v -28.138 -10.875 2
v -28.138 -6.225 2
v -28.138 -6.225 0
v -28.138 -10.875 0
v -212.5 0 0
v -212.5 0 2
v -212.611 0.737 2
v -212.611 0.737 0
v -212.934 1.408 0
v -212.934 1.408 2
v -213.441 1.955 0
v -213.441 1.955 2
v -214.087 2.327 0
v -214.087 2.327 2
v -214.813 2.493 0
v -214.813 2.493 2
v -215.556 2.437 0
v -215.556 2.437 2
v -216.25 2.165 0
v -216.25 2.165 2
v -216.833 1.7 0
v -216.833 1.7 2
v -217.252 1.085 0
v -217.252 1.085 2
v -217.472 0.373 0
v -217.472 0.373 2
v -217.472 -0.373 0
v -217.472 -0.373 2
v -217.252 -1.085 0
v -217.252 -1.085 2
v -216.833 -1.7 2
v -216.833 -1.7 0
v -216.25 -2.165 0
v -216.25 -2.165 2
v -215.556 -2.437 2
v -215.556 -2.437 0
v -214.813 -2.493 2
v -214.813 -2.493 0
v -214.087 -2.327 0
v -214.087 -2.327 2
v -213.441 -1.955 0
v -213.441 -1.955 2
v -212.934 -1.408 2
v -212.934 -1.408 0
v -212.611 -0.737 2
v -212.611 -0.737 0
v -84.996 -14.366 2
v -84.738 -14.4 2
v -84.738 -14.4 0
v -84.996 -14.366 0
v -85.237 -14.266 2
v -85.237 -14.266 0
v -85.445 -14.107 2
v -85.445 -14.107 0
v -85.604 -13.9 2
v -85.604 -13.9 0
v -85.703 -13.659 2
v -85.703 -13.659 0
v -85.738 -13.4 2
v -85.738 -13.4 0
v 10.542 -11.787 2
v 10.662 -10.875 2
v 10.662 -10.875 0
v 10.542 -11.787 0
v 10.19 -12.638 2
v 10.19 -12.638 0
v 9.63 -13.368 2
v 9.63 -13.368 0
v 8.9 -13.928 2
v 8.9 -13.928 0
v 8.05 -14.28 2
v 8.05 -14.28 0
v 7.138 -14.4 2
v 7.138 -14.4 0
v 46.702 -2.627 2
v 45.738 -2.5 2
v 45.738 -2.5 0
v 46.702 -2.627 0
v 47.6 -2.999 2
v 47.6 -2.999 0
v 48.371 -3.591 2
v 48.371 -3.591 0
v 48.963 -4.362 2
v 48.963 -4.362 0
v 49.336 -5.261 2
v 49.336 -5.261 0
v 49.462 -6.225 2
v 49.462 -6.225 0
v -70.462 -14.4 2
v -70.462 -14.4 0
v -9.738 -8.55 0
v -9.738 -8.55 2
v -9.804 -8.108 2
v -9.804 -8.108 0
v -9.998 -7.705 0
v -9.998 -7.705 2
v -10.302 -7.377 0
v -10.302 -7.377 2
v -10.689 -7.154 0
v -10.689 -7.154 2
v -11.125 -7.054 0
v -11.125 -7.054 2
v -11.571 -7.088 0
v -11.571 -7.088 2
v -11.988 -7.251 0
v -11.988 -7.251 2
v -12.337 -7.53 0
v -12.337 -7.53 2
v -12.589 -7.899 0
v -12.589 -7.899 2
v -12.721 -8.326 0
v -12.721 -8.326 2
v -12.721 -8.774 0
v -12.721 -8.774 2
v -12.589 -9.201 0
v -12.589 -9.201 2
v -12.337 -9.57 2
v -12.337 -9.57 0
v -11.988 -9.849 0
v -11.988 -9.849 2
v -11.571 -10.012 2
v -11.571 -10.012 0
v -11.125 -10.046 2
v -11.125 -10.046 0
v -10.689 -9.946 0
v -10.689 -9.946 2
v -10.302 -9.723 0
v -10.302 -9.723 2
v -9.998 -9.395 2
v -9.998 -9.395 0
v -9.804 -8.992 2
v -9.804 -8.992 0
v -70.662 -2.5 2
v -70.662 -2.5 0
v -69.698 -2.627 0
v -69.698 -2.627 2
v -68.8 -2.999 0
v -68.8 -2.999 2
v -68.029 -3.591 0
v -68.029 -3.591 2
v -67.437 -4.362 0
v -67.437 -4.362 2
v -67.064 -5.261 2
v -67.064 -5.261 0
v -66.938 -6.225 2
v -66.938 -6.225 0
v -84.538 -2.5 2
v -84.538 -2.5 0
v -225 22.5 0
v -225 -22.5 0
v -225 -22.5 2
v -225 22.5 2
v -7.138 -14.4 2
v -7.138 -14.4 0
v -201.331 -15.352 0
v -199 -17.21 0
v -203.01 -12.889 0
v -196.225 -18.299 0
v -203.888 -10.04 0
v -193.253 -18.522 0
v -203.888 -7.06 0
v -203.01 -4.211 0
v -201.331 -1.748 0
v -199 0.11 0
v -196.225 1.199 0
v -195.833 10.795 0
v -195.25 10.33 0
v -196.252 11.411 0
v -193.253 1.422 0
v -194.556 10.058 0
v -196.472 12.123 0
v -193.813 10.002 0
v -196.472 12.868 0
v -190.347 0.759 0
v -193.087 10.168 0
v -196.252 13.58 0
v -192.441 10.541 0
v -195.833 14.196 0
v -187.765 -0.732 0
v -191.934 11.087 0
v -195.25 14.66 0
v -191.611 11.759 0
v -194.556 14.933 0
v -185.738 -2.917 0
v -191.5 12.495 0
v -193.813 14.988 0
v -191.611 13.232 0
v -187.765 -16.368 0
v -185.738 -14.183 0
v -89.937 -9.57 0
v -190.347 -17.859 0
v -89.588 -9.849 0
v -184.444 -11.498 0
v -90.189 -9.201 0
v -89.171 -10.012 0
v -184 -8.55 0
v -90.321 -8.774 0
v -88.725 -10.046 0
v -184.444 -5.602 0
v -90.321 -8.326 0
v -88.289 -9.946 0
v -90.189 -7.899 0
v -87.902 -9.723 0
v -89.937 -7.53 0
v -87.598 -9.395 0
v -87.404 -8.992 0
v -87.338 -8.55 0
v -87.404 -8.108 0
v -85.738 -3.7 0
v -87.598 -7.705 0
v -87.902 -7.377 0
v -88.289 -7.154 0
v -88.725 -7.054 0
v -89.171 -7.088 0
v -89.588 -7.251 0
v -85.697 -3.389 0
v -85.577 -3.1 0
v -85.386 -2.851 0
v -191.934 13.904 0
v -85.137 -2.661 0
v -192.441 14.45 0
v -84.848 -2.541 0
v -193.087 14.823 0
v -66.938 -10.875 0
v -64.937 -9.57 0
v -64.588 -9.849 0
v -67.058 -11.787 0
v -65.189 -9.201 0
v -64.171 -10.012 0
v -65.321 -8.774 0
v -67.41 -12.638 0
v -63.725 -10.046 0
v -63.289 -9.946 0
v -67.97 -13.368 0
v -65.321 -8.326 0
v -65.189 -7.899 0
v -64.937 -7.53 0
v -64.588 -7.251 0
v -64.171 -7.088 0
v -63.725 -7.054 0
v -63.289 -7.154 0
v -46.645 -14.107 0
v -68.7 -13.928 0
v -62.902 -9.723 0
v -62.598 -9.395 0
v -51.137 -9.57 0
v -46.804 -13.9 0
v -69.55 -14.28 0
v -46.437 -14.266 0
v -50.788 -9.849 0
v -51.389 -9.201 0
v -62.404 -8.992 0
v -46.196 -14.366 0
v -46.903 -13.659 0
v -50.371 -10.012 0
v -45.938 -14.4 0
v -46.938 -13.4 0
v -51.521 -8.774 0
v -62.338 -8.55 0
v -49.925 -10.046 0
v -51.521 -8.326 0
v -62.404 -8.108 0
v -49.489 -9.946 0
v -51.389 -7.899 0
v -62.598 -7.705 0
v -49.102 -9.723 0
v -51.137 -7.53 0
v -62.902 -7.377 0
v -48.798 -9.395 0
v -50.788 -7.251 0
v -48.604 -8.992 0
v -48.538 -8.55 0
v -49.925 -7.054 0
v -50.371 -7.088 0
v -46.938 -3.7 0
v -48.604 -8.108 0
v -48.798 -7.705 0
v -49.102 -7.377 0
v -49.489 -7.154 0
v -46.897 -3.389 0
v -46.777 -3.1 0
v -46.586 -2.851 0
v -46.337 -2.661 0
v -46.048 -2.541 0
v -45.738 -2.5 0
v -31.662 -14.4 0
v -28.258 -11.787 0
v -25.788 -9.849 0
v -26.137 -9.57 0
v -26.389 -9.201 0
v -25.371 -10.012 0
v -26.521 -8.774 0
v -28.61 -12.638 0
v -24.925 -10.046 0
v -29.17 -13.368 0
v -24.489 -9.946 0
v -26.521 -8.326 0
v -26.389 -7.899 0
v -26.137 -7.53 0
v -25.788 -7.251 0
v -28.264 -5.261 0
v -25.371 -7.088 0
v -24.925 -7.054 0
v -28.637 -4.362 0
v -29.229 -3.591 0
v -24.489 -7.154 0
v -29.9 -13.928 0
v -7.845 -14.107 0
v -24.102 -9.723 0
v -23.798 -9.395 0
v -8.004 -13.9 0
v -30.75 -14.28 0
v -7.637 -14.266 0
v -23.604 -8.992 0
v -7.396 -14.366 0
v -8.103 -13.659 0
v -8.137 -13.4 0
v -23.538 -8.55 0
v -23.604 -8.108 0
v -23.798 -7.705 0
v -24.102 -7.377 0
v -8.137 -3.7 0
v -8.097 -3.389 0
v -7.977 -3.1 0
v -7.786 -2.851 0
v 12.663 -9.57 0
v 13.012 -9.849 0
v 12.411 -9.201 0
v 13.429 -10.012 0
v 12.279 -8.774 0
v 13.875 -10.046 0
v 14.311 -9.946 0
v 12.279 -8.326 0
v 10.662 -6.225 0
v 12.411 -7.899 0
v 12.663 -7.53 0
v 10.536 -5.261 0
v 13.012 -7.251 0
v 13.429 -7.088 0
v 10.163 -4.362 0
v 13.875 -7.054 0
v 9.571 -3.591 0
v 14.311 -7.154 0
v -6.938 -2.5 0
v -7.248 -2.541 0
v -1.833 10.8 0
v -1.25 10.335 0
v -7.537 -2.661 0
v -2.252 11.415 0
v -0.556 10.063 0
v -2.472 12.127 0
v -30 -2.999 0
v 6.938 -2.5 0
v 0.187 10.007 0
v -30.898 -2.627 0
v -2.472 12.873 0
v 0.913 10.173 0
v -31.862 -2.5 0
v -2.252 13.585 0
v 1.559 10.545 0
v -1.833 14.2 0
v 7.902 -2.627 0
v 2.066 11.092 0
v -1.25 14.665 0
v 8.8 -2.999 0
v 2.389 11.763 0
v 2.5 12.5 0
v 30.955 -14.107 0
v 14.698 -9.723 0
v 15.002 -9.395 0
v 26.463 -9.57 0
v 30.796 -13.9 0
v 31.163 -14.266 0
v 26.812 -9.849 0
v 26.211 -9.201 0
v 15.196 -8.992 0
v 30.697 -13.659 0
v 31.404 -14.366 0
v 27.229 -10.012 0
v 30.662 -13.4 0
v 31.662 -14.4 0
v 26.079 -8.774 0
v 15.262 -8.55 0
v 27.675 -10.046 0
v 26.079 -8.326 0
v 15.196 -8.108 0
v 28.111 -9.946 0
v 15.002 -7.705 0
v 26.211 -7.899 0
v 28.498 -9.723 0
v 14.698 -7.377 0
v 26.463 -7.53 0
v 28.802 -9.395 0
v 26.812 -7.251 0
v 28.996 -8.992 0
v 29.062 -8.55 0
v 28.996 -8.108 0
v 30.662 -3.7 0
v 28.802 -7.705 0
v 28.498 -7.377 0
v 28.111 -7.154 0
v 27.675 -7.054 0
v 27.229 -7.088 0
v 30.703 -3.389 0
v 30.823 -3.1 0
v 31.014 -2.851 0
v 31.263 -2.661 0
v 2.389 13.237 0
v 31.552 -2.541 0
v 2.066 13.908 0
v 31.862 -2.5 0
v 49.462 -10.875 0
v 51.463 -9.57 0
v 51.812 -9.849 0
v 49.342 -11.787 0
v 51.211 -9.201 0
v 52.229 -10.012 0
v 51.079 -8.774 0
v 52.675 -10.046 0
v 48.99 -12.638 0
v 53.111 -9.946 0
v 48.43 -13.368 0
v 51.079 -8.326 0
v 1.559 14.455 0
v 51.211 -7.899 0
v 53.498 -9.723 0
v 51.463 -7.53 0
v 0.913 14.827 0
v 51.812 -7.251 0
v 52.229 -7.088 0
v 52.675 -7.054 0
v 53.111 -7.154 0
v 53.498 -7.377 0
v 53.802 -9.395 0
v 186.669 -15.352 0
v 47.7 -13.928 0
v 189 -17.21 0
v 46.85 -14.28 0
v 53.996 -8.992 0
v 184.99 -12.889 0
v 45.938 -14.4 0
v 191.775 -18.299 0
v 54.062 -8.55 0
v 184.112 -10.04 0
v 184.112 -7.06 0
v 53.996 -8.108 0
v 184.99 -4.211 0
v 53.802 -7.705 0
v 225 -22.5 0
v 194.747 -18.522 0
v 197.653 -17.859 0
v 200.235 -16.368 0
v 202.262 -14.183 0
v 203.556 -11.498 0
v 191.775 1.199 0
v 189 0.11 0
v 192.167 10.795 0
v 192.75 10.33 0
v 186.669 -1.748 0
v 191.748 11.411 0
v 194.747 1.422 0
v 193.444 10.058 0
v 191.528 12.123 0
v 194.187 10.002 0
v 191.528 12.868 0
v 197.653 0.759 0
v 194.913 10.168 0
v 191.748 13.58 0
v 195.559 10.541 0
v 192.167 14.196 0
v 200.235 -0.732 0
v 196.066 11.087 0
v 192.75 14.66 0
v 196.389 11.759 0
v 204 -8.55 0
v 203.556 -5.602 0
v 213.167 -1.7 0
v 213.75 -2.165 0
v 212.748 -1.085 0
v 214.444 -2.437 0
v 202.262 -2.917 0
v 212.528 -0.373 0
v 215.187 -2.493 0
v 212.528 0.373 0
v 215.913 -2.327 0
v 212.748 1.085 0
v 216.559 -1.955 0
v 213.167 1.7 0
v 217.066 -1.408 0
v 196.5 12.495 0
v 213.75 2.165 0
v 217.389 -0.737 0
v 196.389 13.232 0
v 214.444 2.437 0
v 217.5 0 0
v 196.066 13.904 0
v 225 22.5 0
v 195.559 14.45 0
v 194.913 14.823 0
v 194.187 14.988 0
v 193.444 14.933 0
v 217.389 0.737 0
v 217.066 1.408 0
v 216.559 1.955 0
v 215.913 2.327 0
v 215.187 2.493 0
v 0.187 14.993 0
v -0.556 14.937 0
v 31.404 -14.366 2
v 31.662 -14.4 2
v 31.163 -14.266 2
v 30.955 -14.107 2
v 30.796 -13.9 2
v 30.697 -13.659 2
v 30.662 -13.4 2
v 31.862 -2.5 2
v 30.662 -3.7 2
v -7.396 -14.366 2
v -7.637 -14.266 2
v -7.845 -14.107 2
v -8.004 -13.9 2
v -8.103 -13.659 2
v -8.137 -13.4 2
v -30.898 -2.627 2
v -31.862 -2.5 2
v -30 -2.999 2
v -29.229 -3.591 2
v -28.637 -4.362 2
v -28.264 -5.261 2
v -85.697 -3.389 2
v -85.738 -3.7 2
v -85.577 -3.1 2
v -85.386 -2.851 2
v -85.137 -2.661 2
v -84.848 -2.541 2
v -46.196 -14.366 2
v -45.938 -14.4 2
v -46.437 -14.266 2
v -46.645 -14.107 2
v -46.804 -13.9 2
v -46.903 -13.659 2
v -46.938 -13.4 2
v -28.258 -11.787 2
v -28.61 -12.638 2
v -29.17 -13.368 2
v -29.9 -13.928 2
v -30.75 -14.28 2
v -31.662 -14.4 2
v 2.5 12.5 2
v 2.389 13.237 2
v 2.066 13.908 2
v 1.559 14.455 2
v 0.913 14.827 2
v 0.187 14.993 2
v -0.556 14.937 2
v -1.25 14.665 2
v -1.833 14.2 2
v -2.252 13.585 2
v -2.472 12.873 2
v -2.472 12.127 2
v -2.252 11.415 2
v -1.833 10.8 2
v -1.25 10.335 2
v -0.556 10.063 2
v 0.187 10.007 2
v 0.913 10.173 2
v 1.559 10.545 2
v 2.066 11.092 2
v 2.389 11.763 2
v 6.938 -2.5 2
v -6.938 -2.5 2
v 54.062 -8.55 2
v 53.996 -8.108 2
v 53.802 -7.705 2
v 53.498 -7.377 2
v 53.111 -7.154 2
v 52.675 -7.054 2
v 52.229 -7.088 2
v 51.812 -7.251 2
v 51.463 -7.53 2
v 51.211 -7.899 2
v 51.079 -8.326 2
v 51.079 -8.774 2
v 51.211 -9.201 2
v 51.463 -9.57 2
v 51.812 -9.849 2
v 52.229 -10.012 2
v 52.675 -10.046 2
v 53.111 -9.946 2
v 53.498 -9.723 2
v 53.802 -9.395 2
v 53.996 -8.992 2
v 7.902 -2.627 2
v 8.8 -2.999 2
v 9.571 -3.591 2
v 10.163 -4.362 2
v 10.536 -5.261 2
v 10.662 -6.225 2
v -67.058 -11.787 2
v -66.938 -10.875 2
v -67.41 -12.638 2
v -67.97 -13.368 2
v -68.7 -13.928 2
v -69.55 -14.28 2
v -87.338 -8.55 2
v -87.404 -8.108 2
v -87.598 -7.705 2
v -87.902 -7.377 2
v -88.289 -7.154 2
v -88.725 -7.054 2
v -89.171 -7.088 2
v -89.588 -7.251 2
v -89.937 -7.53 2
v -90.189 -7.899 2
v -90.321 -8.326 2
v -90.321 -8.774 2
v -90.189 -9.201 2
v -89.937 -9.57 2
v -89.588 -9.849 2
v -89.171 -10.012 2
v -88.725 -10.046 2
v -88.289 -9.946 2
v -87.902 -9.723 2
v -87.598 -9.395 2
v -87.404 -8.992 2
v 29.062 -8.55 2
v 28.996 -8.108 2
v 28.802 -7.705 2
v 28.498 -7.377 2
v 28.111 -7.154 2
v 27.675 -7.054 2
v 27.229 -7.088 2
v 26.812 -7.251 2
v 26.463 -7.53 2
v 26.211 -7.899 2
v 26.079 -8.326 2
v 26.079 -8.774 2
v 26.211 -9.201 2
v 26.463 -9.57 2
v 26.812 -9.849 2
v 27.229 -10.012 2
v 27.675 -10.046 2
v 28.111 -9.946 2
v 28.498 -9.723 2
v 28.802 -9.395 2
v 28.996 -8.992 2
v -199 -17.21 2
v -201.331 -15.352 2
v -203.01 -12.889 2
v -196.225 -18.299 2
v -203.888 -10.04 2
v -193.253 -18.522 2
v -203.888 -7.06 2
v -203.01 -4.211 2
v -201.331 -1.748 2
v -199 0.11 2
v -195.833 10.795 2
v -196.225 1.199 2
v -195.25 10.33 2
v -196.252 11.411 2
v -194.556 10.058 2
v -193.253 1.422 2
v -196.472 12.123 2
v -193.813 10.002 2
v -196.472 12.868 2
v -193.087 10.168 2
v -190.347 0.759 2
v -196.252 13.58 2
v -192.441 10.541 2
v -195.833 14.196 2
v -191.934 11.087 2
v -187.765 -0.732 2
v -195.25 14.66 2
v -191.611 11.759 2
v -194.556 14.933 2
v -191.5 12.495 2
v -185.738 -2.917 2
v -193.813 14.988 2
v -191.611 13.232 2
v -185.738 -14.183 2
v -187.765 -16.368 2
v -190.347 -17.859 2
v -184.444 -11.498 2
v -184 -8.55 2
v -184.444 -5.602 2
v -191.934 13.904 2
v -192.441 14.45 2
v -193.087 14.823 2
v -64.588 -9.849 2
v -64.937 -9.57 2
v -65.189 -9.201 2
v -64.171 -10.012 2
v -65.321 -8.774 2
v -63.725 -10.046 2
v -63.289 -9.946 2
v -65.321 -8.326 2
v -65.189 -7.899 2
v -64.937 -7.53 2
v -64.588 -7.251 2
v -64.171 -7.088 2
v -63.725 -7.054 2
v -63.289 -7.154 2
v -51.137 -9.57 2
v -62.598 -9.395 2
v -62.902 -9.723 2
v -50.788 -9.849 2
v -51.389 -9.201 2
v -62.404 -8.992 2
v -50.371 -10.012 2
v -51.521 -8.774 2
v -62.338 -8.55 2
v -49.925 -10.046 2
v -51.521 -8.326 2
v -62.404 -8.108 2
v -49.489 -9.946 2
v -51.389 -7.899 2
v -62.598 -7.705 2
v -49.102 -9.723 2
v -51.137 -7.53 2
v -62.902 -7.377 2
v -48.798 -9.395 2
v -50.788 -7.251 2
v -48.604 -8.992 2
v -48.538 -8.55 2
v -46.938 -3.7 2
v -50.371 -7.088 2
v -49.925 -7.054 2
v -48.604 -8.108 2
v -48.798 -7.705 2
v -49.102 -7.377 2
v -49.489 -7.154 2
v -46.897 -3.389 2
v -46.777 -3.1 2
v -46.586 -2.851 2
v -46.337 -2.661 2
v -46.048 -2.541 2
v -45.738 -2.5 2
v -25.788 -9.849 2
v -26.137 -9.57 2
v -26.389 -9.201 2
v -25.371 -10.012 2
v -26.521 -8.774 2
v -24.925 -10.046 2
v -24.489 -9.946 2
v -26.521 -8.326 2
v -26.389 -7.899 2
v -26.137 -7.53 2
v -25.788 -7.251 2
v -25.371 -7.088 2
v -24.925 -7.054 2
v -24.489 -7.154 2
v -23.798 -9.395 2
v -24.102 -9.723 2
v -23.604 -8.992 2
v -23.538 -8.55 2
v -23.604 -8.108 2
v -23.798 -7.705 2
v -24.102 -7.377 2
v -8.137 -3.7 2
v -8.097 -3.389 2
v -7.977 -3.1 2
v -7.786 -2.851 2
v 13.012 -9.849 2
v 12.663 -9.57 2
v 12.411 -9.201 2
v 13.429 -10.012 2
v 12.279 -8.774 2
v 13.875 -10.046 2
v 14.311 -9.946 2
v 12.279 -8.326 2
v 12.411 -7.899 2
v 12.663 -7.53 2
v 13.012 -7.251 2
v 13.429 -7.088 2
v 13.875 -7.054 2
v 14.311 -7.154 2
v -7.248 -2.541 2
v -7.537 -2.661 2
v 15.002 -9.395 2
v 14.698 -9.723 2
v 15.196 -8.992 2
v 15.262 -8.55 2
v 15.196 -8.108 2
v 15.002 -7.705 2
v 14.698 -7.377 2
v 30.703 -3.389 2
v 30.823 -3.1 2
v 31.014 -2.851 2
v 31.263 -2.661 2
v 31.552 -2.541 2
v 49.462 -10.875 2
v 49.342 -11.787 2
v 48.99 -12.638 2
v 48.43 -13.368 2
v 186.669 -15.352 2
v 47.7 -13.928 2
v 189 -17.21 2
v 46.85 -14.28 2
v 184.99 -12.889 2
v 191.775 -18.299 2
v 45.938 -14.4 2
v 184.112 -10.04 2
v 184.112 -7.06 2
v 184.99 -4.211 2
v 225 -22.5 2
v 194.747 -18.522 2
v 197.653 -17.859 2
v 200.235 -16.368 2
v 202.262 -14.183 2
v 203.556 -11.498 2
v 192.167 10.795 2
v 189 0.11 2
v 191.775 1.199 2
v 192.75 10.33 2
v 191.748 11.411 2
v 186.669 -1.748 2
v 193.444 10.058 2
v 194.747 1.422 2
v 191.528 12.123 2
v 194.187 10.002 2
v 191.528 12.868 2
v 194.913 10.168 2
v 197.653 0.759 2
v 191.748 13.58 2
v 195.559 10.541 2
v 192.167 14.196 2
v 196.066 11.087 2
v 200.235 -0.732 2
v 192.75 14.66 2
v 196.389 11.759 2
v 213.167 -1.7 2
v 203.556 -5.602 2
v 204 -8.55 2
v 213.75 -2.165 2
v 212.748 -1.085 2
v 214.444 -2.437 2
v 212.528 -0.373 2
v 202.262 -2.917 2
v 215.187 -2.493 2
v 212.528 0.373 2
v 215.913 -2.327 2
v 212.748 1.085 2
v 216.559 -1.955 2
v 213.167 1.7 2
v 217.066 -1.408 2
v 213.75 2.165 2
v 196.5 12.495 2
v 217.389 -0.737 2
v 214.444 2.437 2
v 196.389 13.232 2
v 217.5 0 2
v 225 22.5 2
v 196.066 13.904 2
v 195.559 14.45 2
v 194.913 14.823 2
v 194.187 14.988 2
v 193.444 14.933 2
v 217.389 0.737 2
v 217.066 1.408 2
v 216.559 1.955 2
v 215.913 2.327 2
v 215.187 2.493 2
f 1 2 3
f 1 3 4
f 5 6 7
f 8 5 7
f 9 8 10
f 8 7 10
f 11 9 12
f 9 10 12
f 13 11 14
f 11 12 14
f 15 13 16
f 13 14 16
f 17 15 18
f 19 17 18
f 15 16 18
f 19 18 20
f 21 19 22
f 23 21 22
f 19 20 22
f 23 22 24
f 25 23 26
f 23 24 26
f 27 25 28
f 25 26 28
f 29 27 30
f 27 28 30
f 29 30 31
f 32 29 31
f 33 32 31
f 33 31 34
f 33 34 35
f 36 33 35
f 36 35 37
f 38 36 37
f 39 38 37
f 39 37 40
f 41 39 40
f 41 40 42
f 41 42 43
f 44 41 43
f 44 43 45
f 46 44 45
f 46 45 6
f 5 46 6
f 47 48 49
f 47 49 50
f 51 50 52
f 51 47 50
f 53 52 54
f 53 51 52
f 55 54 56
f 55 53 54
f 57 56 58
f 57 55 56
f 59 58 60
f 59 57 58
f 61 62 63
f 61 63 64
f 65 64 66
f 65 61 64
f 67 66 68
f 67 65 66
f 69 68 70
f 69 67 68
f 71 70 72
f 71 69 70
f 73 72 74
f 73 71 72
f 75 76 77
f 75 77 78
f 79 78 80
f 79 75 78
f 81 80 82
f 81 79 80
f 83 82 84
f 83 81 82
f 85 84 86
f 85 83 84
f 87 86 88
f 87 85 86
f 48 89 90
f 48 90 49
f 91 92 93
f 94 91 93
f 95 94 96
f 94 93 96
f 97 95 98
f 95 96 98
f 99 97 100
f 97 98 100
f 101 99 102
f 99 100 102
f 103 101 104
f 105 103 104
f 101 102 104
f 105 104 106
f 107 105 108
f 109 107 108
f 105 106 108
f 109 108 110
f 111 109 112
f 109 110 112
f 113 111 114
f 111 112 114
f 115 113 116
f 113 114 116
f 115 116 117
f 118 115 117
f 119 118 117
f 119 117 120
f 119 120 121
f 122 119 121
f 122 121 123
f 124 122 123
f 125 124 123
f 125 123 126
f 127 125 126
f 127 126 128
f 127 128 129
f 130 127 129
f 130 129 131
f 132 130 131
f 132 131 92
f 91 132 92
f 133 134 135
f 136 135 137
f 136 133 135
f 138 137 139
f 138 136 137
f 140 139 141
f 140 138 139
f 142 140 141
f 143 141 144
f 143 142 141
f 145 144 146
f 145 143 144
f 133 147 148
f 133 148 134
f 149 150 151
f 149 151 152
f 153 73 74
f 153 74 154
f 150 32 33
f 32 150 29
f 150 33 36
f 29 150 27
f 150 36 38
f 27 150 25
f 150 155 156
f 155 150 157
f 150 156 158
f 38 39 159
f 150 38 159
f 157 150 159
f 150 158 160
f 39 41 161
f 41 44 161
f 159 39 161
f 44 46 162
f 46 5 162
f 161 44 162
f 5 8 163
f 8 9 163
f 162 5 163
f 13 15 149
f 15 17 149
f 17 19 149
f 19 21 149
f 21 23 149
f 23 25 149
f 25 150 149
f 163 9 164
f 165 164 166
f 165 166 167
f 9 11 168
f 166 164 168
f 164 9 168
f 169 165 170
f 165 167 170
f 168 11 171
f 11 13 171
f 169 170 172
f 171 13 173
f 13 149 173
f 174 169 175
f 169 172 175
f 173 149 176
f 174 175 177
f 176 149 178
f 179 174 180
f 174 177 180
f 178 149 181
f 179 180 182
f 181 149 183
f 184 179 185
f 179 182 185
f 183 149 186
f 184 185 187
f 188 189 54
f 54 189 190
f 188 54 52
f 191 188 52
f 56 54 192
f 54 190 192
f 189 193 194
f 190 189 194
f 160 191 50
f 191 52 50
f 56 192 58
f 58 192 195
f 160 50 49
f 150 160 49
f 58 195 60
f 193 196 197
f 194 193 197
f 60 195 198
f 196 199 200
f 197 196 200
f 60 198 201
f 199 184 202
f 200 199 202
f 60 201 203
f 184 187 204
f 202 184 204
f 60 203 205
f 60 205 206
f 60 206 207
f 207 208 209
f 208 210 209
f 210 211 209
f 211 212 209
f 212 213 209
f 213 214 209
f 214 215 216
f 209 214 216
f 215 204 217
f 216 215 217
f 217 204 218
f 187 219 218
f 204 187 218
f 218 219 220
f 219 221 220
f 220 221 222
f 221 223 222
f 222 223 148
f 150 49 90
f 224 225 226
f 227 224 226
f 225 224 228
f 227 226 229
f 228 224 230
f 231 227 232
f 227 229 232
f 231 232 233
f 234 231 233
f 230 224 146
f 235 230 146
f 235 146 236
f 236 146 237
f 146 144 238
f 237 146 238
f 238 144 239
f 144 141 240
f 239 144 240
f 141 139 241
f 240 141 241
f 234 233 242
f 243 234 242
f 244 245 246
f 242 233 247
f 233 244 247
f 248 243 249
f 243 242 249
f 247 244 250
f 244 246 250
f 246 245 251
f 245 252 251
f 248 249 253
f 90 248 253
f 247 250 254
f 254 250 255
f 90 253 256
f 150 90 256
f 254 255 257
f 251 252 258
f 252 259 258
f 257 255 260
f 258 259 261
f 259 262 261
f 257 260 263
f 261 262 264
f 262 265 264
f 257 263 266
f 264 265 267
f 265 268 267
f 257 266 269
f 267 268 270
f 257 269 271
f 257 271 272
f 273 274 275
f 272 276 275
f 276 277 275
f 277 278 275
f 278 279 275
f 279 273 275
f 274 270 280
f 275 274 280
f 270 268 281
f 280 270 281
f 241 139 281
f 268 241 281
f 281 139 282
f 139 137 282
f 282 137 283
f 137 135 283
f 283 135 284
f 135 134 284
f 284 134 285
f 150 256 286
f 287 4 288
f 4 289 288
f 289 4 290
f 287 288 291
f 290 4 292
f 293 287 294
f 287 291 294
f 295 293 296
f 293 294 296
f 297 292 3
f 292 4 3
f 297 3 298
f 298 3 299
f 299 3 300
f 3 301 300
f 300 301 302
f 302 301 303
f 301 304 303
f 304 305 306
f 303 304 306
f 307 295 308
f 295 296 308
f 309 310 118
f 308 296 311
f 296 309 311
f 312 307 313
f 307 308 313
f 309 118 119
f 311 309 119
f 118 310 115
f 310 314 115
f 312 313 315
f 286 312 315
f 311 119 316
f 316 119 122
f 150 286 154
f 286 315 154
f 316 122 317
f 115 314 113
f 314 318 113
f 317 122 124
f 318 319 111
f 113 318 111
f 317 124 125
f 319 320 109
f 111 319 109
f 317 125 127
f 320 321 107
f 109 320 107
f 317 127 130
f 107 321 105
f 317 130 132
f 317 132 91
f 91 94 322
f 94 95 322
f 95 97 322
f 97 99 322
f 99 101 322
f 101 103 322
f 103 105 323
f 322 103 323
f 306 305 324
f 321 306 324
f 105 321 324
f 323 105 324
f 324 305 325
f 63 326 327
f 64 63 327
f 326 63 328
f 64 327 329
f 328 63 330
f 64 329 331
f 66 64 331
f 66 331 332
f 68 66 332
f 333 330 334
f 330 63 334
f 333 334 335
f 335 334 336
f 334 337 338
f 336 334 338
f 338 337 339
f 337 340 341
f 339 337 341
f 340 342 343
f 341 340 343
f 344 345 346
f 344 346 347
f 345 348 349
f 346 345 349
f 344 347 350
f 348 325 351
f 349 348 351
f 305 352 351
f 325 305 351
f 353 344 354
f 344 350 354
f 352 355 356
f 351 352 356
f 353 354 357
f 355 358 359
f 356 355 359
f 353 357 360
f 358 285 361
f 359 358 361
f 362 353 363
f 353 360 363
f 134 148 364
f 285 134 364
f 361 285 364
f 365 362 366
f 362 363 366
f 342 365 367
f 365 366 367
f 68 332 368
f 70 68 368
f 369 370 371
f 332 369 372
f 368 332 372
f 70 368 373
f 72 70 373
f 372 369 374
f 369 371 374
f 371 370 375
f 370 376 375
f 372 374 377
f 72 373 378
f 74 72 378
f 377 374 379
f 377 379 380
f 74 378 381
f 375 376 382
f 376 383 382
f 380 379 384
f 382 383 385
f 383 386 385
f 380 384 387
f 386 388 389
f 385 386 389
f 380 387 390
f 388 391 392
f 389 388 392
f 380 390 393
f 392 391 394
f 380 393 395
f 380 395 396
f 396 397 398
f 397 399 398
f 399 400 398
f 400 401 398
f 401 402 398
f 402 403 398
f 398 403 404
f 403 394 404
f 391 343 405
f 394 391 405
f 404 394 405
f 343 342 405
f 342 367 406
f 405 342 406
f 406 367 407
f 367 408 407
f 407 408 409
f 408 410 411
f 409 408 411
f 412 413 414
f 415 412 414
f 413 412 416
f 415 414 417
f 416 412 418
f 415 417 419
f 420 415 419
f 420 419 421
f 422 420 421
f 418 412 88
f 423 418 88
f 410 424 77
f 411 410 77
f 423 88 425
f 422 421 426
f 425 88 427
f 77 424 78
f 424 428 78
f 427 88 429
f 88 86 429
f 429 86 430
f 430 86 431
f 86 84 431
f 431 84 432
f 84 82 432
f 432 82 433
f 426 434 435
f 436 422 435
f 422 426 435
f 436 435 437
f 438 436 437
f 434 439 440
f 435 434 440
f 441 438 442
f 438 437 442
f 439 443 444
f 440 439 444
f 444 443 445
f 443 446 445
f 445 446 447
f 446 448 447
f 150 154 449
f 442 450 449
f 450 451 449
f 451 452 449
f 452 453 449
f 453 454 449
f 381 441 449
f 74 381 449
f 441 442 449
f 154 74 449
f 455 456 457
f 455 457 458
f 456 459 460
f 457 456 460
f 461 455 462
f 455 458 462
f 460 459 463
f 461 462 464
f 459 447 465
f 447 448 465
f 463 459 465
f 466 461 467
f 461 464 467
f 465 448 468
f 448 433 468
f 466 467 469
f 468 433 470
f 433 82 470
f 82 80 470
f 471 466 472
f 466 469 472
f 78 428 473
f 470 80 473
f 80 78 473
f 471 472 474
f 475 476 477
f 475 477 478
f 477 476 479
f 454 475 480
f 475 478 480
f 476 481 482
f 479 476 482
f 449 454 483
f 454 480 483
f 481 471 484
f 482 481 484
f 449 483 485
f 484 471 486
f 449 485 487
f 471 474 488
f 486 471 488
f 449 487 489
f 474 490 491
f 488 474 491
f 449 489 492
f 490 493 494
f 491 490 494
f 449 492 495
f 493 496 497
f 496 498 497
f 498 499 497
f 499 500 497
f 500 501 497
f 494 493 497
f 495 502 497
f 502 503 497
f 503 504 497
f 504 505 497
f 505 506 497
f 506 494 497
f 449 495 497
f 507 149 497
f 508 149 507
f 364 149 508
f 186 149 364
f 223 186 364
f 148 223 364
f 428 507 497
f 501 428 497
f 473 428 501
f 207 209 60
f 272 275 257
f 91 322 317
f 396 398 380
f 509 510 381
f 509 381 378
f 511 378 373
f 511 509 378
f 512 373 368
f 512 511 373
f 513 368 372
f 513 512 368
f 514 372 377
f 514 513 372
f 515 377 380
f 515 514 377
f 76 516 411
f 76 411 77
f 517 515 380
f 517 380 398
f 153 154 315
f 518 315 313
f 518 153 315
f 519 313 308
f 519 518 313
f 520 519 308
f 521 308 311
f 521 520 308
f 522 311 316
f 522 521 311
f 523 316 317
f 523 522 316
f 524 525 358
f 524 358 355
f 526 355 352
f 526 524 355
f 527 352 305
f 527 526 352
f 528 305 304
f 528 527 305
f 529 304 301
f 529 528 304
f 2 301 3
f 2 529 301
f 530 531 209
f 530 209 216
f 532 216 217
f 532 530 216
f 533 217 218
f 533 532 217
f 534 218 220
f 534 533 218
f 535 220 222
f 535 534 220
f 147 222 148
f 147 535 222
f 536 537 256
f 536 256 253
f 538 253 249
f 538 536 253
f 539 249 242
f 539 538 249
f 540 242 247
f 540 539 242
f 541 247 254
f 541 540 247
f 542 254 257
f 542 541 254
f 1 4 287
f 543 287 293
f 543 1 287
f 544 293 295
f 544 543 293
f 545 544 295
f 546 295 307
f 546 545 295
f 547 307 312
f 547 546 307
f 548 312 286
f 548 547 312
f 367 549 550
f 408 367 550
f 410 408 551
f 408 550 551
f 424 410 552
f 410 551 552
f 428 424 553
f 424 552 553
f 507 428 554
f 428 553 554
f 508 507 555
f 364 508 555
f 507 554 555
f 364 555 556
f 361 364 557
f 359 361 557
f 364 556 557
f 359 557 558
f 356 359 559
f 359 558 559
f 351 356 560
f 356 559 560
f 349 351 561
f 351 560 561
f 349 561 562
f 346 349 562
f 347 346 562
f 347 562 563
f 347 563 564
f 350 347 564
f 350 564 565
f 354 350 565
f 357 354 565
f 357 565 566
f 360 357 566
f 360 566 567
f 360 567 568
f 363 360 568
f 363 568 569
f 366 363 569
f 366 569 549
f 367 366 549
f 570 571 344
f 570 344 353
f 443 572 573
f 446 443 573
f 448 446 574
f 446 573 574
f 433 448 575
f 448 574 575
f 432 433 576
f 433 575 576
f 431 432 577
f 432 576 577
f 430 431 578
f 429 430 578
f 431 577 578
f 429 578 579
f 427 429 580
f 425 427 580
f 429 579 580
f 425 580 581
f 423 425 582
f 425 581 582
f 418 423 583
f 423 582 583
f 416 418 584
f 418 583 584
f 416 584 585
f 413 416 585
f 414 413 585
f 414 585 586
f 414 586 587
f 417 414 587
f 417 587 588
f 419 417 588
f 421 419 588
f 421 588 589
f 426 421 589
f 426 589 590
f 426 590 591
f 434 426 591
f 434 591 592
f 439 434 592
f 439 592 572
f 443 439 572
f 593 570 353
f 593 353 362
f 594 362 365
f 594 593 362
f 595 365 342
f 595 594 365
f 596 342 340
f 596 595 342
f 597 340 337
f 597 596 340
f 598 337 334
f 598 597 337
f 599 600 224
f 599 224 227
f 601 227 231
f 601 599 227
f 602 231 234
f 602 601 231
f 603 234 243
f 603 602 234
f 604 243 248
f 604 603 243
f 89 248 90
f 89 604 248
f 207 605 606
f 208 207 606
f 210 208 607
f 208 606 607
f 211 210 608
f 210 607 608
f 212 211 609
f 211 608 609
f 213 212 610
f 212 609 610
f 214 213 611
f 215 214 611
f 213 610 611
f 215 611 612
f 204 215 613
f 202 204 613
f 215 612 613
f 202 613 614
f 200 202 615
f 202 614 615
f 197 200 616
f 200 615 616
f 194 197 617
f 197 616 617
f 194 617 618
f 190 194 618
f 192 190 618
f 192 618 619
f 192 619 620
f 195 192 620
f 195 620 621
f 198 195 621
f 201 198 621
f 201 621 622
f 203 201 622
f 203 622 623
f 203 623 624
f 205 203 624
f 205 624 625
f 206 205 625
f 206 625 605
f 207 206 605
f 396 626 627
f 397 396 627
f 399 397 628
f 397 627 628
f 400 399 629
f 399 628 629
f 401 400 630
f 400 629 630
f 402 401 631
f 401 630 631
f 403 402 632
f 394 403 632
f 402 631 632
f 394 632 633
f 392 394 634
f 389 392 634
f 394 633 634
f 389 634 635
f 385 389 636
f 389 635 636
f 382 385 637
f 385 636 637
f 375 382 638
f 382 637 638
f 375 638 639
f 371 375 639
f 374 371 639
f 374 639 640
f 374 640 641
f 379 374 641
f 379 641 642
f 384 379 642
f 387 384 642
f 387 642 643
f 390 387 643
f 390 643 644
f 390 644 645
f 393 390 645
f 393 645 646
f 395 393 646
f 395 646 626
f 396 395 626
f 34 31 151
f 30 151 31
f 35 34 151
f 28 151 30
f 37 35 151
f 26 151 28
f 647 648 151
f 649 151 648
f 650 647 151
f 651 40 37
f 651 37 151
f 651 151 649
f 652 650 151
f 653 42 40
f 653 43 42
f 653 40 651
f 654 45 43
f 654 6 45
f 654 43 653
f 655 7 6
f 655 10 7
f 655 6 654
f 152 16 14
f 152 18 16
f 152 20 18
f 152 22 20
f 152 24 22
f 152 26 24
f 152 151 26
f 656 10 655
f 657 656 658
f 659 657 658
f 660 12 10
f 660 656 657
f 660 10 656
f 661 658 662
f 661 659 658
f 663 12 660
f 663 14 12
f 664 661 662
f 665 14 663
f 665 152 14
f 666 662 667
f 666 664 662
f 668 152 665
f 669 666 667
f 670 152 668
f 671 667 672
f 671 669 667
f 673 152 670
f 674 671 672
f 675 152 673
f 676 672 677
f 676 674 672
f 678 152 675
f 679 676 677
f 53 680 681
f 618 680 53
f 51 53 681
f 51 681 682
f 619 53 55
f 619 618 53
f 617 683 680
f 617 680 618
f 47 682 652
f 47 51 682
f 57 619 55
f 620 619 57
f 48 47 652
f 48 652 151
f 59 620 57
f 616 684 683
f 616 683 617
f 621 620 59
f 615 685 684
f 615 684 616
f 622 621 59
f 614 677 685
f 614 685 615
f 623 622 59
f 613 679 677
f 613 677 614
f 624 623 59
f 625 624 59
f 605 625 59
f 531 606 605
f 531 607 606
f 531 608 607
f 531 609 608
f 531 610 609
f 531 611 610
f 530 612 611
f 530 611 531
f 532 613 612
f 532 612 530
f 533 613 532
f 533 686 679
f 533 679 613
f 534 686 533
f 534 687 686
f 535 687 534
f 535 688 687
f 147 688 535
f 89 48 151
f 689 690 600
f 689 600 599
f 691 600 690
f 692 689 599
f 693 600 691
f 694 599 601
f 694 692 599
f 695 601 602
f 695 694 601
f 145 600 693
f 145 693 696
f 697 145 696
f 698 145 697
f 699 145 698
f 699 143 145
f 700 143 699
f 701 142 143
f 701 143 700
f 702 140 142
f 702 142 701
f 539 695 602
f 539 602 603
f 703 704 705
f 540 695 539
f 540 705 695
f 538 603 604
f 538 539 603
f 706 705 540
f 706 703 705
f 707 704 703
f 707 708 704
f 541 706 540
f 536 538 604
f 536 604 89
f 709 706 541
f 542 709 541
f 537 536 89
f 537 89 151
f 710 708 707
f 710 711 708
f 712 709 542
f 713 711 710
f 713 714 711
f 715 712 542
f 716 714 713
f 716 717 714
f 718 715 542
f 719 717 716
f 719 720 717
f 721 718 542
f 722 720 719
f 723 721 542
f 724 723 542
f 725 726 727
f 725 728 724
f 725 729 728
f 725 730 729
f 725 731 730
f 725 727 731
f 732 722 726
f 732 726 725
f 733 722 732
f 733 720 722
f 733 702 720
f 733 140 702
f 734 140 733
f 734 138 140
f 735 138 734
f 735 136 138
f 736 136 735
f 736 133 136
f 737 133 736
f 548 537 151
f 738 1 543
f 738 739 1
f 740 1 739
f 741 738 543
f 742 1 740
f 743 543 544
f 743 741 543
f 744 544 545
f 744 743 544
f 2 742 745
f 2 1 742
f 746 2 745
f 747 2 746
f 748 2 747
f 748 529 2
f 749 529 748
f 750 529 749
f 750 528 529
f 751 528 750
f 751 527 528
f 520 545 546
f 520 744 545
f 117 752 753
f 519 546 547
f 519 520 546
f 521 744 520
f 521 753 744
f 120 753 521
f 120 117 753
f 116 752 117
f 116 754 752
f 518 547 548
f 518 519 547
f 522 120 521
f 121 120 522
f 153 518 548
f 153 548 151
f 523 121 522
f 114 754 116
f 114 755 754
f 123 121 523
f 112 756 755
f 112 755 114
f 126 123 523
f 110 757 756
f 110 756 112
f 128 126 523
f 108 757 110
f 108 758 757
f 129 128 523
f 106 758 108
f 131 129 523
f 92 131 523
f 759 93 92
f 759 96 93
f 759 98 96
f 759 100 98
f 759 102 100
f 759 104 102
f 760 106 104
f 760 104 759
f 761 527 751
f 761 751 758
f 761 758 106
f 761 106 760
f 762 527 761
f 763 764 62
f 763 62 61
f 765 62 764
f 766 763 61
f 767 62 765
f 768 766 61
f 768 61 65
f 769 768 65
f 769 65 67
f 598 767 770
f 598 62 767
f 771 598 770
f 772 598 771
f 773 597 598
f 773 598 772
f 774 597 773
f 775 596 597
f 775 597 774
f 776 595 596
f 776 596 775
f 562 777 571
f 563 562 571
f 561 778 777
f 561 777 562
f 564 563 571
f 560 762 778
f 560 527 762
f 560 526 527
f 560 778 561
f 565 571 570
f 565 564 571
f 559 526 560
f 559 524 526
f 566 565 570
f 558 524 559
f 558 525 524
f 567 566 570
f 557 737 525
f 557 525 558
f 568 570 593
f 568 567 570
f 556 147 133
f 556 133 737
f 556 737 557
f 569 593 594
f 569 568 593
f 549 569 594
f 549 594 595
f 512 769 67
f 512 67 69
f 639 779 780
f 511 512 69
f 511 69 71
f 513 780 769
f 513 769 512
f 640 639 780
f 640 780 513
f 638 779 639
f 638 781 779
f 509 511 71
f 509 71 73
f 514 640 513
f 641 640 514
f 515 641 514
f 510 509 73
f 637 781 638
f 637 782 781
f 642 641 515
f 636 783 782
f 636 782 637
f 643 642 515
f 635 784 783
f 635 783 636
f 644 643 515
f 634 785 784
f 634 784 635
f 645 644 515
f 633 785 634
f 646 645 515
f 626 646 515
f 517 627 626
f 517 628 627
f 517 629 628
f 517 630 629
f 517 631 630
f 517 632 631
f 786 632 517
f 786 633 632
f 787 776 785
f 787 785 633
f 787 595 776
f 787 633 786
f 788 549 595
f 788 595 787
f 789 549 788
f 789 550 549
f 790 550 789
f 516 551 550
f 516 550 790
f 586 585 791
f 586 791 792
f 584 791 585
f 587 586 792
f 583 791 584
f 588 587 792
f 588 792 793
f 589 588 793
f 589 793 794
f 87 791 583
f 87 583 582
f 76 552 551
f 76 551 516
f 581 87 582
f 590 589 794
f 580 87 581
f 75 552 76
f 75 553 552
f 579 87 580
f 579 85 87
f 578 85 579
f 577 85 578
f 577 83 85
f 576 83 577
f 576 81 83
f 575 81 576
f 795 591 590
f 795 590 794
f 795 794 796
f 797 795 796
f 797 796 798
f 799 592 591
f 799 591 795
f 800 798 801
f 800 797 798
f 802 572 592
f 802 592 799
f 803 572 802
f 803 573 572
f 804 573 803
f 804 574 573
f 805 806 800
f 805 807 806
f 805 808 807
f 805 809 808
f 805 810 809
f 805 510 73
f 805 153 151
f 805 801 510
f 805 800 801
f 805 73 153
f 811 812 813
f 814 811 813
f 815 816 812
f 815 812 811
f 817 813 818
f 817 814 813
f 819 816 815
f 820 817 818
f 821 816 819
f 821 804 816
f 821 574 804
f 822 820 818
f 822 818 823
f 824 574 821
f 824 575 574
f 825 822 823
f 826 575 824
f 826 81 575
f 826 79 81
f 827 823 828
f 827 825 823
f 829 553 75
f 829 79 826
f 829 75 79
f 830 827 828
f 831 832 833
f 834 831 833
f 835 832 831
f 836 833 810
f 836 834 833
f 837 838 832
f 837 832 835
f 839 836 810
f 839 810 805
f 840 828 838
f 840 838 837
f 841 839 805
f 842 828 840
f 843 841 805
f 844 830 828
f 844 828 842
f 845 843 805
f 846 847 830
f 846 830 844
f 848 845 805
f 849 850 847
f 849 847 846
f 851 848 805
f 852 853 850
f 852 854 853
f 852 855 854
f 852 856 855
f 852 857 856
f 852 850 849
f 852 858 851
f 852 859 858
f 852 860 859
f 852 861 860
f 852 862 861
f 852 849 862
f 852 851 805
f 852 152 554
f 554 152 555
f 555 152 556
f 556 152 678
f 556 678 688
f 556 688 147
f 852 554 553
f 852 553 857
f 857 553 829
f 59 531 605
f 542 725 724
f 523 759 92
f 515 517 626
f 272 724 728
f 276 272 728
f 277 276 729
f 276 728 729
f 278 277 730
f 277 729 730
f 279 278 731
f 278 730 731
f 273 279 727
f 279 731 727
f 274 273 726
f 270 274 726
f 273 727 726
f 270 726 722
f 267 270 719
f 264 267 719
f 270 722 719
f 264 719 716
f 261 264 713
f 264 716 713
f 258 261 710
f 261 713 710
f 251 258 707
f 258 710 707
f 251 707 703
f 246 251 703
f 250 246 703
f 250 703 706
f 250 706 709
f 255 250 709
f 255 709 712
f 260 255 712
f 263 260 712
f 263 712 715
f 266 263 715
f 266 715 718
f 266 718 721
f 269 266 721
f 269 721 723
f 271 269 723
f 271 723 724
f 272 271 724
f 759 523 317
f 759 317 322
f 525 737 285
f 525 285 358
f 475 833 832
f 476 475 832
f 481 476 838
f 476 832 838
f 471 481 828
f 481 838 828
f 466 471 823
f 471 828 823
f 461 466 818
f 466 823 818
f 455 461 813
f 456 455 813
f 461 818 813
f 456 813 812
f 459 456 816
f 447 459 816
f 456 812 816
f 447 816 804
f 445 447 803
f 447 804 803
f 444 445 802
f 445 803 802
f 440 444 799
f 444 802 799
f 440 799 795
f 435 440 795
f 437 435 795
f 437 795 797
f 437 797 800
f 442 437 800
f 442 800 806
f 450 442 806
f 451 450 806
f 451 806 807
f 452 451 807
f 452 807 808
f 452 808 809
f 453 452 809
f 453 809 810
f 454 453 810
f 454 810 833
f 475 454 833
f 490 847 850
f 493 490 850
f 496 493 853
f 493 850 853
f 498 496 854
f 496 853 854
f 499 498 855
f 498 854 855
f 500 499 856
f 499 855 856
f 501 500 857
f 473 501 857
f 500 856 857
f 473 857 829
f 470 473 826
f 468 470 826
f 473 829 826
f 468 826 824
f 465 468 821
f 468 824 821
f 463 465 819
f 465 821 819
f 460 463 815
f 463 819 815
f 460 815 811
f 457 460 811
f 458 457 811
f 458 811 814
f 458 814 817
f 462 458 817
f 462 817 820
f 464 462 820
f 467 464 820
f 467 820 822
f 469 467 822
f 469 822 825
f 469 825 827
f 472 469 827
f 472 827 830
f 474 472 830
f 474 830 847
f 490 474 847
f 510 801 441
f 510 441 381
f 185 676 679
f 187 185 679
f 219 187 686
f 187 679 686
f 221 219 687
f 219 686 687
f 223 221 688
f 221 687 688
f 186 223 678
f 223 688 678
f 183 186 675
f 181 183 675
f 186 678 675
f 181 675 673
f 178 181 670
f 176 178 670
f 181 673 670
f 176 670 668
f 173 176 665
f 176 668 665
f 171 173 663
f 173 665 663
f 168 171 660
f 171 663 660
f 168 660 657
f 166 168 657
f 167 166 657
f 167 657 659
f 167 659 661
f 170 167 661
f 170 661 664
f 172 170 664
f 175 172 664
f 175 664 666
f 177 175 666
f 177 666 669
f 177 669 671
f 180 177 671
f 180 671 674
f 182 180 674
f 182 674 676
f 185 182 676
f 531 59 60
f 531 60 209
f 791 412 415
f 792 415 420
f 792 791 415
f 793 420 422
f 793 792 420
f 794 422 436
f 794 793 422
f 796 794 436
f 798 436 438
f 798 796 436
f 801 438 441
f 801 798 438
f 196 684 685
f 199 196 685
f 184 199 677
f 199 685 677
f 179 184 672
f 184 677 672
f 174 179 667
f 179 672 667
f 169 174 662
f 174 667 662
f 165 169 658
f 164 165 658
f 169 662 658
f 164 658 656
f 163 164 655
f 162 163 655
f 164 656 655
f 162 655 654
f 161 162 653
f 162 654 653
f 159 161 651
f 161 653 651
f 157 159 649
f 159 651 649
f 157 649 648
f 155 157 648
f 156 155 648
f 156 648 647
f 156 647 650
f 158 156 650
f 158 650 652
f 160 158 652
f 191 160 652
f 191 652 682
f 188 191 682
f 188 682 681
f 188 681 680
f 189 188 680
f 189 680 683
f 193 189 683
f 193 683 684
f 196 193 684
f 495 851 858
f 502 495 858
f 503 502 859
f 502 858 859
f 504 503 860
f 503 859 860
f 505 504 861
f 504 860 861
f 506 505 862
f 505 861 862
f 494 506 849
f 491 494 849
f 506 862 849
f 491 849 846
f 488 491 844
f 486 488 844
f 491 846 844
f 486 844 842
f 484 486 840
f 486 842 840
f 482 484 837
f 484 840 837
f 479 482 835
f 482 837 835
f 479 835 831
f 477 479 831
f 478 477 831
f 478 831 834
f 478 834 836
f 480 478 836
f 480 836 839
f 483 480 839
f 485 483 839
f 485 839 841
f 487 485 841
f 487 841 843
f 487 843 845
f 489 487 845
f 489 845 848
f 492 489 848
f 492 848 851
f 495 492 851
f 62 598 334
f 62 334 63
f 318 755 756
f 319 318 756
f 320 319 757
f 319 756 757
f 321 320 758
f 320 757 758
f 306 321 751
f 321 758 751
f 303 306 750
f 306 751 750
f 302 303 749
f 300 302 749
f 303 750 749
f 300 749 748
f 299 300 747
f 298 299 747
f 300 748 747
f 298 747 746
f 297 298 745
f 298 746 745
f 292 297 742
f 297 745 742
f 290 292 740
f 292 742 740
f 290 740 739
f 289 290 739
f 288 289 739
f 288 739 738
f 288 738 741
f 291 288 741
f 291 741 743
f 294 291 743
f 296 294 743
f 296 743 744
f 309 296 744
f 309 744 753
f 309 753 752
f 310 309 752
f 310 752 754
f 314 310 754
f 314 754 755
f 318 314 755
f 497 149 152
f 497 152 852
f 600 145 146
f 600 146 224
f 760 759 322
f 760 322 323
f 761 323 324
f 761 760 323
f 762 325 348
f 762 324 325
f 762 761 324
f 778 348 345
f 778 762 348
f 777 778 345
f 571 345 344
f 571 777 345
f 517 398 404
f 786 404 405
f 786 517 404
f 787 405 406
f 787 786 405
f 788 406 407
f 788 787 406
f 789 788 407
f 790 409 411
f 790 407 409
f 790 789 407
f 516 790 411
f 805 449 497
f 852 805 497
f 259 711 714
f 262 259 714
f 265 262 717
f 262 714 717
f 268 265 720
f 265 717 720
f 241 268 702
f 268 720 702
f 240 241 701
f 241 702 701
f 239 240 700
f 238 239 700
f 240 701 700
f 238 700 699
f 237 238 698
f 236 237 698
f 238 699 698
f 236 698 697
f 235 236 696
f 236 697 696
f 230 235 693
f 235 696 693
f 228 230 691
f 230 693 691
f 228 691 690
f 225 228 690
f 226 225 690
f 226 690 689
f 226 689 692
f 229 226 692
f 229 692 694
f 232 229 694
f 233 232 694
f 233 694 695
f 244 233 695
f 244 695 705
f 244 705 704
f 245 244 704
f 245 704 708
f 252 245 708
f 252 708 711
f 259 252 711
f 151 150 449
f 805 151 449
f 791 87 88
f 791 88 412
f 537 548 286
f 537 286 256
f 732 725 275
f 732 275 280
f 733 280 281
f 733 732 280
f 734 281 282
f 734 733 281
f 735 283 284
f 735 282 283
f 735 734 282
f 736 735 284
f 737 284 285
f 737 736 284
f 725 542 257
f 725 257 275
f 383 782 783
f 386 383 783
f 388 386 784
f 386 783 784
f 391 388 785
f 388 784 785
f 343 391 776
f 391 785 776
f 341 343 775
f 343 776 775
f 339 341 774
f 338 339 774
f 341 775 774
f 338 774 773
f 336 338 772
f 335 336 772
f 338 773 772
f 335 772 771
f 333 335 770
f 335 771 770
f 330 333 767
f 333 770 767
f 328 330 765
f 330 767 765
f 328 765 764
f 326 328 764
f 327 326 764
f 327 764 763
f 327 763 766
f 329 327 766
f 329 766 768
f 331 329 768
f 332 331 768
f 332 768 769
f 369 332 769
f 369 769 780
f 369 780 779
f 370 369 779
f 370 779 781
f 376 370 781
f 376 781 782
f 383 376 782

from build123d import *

# Parameters (mm, degrees)
SKETCH1_W           = 450
SKETCH1_H           = 45
BOSS_EXTRUDE1_DEPTH = 2
SKETCH2_R           = 1.5
CUT_EXTRUDE1_DEPTH  = 227.131046077
SKETCH3_R           = 2.5
CUT_EXTRUDE2_DEPTH  = 227.131046077
SKETCH4_R           = 10
CUT_EXTRUDE3_DEPTH  = 10


with BuildPart() as part:
    # Sketch1 → Boss-Extrude1 (new body)
    with BuildSketch(Plane.XY):
        Rectangle(SKETCH1_W, SKETCH1_H)
    extrude(amount=BOSS_EXTRUDE1_DEPTH)

    # Sketch2 → Cut-Extrude1 (cut, through all)
    with BuildSketch(Plane.XY.offset(2)):
        with Locations((-50.0375, -8.55)):
            Circle(SKETCH2_R)
        with Locations((-25.0375, -8.55)):
            Circle(SKETCH2_R)
        with Locations((-11.2375, -8.55)):
            Circle(SKETCH2_R)
        with Locations((13.7625, -8.55)):
            Circle(SKETCH2_R)
        with Locations((27.5625, -8.55)):
            Circle(SKETCH2_R)
        with Locations((52.5625, -8.55)):
            Circle(SKETCH2_R)
        with Locations((-88.8375, -8.55)):
            Circle(SKETCH2_R)
        with Locations((-63.8375, -8.55)):
            Circle(SKETCH2_R)
        with BuildLine():
            Line((-31.6625, -14.4), (-45.9375, -14.4))
            ThreePointArc((-45.9375, -14.4), (-46.644606781, -14.107106781), (-46.9375, -13.4))
            Line((-46.9375, -13.4), (-46.9375, -3.7))
            ThreePointArc((-46.9375, -3.7), (-46.586028137, -2.851471863), (-45.7375, -2.5))
            Line((-45.7375, -2.5), (-31.8625, -2.5))
            ThreePointArc((-31.8625, -2.5), (-29.22852724, -3.59102724), (-28.1375, -6.225))
            Line((-28.1375, -6.225), (-28.1375, -10.875))
            ThreePointArc((-28.1375, -10.875), (-29.169948596, -13.367551404), (-31.6625, -14.4))
        make_face()
        with BuildLine():
            Line((7.1375, -14.4), (-7.1375, -14.4))
            ThreePointArc((-7.1375, -14.4), (-7.844606781, -14.107106781), (-8.1375, -13.4))
            Line((-8.1375, -13.4), (-8.1375, -3.7))
            ThreePointArc((-8.1375, -3.7), (-7.786028137, -2.851471863), (-6.9375, -2.5))
            Line((-6.9375, -2.5), (6.9375, -2.5))
            ThreePointArc((6.9375, -2.5), (9.57147276, -3.59102724), (10.6625, -6.225))
            Line((10.6625, -6.225), (10.6625, -10.875))
            ThreePointArc((10.6625, -10.875), (9.630051404, -13.367551404), (7.1375, -14.4))
        make_face()
        with BuildLine():
            Line((45.9375, -14.4), (31.6625, -14.4))
            ThreePointArc((31.6625, -14.4), (30.955393219, -14.107106781), (30.6625, -13.4))
            Line((30.6625, -13.4), (30.6625, -3.7))
            ThreePointArc((30.6625, -3.7), (31.013971863, -2.851471863), (31.8625, -2.5))
            Line((31.8625, -2.5), (45.7375, -2.5))
            ThreePointArc((45.7375, -2.5), (48.37147276, -3.59102724), (49.4625, -6.225))
            Line((49.4625, -6.225), (49.4625, -10.875))
            ThreePointArc((49.4625, -10.875), (48.430051404, -13.367551404), (45.9375, -14.4))
        make_face()
        with BuildLine():
            Line((-70.4625, -14.4), (-84.7375, -14.4))
            ThreePointArc((-84.7375, -14.4), (-85.444606781, -14.107106781), (-85.7375, -13.4))
            Line((-85.7375, -13.4), (-85.7375, -3.7))
            ThreePointArc((-85.7375, -3.7), (-85.386028137, -2.851471863), (-84.5375, -2.5))
            Line((-84.5375, -2.5), (-70.6625, -2.5))
            ThreePointArc((-70.6625, -2.5), (-68.02852724, -3.59102724), (-66.9375, -6.225))
            Line((-66.9375, -6.225), (-66.9375, -10.875))
            ThreePointArc((-66.9375, -10.875), (-67.969948596, -13.367551404), (-70.4625, -14.4))
        make_face()
    extrude(amount=-CUT_EXTRUDE1_DEPTH, mode=Mode.SUBTRACT)

    # Sketch3 → Cut-Extrude2 (cut, through all)
    with BuildSketch(Plane.XY.offset(2)):
        with Locations((-215, 0)):
            Circle(SKETCH3_R)
        with Locations((215, 0)):
            Circle(SKETCH3_R)
        with Locations((-194, 12.495407459)):
            Circle(SKETCH3_R)
        with Locations((194, 12.495407459)):
            Circle(SKETCH3_R)
        with Locations((0, 12.5)):
            Circle(SKETCH3_R)
    extrude(amount=-CUT_EXTRUDE2_DEPTH, mode=Mode.SUBTRACT)

    # Sketch4 → Cut-Extrude3 (cut)
    with BuildSketch(Plane.XY.offset(2)):
        with Locations((-194, -8.55)):
            Circle(SKETCH4_R)
        with Locations((194, -8.55)):
            Circle(SKETCH4_R)
    extrude(amount=-CUT_EXTRUDE3_DEPTH, mode=Mode.SUBTRACT)


solid = part.part
